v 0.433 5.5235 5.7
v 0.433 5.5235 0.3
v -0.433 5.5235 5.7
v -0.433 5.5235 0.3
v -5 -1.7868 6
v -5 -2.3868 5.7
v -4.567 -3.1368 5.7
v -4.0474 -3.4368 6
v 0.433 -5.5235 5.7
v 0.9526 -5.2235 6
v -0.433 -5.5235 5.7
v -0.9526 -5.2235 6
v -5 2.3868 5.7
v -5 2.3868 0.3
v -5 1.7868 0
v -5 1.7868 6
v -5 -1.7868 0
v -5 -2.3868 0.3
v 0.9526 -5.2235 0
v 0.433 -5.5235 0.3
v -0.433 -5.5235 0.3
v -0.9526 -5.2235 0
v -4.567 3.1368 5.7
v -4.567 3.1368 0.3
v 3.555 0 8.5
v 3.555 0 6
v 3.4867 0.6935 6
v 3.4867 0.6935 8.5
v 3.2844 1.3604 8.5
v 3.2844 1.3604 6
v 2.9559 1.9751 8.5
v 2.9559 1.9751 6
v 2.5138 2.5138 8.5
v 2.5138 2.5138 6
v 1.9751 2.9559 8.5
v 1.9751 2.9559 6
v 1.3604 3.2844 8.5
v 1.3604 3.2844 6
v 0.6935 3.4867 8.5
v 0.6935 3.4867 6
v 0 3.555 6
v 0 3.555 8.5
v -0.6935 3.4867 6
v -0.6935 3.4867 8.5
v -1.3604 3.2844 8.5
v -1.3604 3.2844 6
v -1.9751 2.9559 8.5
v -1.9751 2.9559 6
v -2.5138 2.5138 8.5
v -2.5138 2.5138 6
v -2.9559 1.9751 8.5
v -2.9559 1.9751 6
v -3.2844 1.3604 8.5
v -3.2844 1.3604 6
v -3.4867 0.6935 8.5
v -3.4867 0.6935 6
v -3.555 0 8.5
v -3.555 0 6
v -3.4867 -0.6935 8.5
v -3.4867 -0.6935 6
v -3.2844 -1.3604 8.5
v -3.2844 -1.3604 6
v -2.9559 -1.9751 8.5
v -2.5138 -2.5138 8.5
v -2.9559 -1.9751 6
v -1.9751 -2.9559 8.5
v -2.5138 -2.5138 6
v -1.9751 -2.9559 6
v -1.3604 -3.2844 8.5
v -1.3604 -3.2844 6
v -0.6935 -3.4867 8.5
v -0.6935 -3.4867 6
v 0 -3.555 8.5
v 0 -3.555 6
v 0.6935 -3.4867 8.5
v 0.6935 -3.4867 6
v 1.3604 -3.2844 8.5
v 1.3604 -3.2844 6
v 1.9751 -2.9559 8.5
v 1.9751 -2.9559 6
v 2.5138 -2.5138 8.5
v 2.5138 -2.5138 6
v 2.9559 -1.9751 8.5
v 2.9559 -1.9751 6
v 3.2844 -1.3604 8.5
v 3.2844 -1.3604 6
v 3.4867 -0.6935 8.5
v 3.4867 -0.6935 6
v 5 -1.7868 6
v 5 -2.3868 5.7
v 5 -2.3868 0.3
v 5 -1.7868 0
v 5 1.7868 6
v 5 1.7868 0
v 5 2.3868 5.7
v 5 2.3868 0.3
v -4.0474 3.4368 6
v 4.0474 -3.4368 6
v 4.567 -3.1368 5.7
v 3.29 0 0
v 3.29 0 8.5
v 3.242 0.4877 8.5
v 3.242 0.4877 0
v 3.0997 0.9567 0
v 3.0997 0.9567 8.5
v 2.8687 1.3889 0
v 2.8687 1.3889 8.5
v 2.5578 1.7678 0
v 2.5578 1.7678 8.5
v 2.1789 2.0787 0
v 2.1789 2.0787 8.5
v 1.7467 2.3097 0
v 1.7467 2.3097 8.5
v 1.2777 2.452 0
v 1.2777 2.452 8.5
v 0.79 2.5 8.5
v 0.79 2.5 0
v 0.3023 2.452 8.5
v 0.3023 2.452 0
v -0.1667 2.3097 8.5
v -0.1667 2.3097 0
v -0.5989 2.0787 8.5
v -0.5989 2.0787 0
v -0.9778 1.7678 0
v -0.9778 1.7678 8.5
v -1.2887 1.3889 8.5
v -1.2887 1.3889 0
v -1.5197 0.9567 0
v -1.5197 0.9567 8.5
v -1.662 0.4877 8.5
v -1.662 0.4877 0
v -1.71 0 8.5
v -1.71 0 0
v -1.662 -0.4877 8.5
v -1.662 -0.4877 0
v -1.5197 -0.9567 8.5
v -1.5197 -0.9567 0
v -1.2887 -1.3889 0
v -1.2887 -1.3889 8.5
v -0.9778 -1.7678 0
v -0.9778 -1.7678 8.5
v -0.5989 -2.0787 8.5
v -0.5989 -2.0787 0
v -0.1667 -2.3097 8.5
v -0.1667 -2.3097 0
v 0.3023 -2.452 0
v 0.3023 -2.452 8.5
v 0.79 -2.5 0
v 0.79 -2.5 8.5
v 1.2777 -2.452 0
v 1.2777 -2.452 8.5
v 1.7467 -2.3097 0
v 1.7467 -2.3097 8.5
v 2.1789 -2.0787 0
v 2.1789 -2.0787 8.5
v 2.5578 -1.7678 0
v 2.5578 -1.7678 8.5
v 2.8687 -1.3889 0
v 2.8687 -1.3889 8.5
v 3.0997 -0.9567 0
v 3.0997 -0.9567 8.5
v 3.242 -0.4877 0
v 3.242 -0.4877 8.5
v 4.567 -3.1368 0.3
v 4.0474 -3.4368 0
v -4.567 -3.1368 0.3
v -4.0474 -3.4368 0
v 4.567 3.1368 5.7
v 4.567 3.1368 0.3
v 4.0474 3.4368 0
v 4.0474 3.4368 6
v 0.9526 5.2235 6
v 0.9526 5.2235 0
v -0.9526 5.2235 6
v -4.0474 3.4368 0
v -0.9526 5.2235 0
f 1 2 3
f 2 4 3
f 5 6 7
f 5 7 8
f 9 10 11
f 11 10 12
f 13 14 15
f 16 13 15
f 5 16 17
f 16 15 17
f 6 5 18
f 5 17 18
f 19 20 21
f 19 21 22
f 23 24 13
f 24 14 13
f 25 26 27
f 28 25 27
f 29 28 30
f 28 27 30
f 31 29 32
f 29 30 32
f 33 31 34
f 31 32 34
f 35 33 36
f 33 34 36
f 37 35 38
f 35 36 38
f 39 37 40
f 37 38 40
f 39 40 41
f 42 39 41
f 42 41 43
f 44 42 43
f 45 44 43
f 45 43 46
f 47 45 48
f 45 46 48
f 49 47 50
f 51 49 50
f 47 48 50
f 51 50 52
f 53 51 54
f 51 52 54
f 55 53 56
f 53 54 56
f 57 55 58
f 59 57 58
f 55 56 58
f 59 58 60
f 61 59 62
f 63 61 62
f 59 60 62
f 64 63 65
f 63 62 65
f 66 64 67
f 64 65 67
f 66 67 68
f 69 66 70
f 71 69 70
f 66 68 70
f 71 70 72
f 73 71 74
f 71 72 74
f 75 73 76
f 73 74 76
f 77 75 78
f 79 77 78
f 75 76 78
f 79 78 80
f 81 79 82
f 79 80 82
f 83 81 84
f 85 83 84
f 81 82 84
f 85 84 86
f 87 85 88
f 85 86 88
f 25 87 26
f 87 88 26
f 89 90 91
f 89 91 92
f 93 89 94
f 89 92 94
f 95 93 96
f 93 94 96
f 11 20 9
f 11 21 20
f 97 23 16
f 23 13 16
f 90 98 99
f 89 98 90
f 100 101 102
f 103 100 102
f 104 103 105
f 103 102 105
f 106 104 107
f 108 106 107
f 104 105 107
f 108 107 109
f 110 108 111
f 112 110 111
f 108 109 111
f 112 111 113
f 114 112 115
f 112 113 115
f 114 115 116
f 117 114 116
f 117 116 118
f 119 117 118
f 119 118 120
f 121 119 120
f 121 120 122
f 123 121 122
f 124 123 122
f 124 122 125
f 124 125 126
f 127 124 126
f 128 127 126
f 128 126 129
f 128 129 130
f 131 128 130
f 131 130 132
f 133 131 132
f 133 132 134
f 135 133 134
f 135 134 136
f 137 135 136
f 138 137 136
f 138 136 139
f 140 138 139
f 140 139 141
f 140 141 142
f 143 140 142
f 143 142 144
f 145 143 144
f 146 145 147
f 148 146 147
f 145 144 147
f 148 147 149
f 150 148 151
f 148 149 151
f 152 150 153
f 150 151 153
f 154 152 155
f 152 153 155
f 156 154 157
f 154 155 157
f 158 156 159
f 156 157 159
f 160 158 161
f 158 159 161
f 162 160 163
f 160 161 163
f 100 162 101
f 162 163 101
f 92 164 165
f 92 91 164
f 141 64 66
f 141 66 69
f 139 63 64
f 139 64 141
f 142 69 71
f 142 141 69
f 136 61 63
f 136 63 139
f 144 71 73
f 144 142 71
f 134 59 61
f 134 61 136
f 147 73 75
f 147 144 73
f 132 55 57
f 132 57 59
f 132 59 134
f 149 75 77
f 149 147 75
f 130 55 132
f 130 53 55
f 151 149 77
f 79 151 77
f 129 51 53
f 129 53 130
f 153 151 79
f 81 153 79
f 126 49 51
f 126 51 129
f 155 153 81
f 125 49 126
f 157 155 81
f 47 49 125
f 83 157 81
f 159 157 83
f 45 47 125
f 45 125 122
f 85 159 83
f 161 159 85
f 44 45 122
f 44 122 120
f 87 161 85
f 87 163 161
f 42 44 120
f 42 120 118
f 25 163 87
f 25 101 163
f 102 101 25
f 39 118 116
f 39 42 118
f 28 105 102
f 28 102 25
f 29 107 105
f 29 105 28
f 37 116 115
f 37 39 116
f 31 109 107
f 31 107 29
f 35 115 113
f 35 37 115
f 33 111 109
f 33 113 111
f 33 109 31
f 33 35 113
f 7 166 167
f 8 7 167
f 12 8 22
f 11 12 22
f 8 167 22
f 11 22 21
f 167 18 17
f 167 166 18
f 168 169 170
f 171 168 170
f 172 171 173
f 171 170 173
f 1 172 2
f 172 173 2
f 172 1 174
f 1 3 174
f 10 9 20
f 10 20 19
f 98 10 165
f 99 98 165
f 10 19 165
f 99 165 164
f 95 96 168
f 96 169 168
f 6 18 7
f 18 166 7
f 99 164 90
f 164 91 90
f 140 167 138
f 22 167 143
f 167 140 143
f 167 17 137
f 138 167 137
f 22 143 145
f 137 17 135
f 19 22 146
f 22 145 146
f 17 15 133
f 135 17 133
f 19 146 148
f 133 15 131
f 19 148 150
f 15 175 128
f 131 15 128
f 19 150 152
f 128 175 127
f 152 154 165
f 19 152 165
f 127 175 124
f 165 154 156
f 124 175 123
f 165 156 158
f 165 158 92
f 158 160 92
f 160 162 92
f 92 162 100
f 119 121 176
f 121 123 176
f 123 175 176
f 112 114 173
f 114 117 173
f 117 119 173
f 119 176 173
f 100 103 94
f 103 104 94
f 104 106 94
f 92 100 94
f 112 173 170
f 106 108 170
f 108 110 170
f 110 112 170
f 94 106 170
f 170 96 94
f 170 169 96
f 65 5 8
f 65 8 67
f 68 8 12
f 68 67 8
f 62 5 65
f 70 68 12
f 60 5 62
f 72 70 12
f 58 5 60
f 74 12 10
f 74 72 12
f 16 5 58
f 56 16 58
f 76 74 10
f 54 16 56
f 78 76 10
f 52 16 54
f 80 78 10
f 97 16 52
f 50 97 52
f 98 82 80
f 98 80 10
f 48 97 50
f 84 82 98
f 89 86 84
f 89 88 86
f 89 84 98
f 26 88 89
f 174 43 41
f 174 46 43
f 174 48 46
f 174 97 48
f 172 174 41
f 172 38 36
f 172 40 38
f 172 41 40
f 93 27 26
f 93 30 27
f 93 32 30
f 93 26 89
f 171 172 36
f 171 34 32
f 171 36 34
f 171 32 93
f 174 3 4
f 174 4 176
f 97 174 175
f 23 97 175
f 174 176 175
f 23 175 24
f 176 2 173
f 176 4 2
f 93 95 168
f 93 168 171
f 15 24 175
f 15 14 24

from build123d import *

# Parameters (mm, degrees)
F1_DEPTH = 6
F2_SIZE  = 0.5
F3_SIZE  = 0.3
F4_R     = 3.555
F5_DEPTH = 2.5
F6_R     = 2.5
F7_DEPTH = 8.501


with BuildPart() as f1:
    # F0 (on Top) → F1 (new body)
    with BuildSketch(Plane.XY):
        Polygon((0, -5.7735026919), (5, -2.8867513459), (5, 2.8867513459), (0, 5.7735026919), (-5, 2.8867513459), (-5, -2.8867513459), align=None)
    extrude(amount=F1_DEPTH)

    # F2
    f2_edges = [f1.edges().sort_by_distance(p)[0] for p in [
        (5, 2.886751, 3),
        (0, 5.773503, 3),
        (5, -2.886751, 3),
        (0, -5.773503, 3),
        (-5, -2.886751, 3),
        (-5, 2.886751, 3),
    ]]
    chamfer(f2_edges, length=F2_SIZE)

    # F3
    f3_edges = [f1.edges().sort_by_distance(p)[0] for p in [
        (4.783494, 2.761751, 6),
        (4.783494, -2.761751, 6),
        (0, 5.523503, 6),
        (-4.783494, 2.761751, 6),
        (-4.783494, -2.761751, 6),
        (0, -5.523503, 6),
        (-4.783494, -2.761751, 0),
        (0, -5.523503, 0),
        (4.783494, -2.761751, 0),
        (4.783494, 2.761751, 0),
        (0, 5.523503, 0),
        (-4.783494, 2.761751, 0),
    ]]
    chamfer(f3_edges, length=F3_SIZE)

    # F4 (on face) → F5 (join)
    with BuildSketch(Plane.XY.offset(6)):
        Circle(F4_R)
    extrude(amount=F5_DEPTH)

    # F6 (on face) → F7 (cut, through all)
    with BuildSketch(Plane.XY.offset(8.5)):
        with Locations((0.79, 0)):
            Circle(F6_R)
    extrude(amount=-F7_DEPTH, mode=Mode.SUBTRACT)


solid = f1.part
